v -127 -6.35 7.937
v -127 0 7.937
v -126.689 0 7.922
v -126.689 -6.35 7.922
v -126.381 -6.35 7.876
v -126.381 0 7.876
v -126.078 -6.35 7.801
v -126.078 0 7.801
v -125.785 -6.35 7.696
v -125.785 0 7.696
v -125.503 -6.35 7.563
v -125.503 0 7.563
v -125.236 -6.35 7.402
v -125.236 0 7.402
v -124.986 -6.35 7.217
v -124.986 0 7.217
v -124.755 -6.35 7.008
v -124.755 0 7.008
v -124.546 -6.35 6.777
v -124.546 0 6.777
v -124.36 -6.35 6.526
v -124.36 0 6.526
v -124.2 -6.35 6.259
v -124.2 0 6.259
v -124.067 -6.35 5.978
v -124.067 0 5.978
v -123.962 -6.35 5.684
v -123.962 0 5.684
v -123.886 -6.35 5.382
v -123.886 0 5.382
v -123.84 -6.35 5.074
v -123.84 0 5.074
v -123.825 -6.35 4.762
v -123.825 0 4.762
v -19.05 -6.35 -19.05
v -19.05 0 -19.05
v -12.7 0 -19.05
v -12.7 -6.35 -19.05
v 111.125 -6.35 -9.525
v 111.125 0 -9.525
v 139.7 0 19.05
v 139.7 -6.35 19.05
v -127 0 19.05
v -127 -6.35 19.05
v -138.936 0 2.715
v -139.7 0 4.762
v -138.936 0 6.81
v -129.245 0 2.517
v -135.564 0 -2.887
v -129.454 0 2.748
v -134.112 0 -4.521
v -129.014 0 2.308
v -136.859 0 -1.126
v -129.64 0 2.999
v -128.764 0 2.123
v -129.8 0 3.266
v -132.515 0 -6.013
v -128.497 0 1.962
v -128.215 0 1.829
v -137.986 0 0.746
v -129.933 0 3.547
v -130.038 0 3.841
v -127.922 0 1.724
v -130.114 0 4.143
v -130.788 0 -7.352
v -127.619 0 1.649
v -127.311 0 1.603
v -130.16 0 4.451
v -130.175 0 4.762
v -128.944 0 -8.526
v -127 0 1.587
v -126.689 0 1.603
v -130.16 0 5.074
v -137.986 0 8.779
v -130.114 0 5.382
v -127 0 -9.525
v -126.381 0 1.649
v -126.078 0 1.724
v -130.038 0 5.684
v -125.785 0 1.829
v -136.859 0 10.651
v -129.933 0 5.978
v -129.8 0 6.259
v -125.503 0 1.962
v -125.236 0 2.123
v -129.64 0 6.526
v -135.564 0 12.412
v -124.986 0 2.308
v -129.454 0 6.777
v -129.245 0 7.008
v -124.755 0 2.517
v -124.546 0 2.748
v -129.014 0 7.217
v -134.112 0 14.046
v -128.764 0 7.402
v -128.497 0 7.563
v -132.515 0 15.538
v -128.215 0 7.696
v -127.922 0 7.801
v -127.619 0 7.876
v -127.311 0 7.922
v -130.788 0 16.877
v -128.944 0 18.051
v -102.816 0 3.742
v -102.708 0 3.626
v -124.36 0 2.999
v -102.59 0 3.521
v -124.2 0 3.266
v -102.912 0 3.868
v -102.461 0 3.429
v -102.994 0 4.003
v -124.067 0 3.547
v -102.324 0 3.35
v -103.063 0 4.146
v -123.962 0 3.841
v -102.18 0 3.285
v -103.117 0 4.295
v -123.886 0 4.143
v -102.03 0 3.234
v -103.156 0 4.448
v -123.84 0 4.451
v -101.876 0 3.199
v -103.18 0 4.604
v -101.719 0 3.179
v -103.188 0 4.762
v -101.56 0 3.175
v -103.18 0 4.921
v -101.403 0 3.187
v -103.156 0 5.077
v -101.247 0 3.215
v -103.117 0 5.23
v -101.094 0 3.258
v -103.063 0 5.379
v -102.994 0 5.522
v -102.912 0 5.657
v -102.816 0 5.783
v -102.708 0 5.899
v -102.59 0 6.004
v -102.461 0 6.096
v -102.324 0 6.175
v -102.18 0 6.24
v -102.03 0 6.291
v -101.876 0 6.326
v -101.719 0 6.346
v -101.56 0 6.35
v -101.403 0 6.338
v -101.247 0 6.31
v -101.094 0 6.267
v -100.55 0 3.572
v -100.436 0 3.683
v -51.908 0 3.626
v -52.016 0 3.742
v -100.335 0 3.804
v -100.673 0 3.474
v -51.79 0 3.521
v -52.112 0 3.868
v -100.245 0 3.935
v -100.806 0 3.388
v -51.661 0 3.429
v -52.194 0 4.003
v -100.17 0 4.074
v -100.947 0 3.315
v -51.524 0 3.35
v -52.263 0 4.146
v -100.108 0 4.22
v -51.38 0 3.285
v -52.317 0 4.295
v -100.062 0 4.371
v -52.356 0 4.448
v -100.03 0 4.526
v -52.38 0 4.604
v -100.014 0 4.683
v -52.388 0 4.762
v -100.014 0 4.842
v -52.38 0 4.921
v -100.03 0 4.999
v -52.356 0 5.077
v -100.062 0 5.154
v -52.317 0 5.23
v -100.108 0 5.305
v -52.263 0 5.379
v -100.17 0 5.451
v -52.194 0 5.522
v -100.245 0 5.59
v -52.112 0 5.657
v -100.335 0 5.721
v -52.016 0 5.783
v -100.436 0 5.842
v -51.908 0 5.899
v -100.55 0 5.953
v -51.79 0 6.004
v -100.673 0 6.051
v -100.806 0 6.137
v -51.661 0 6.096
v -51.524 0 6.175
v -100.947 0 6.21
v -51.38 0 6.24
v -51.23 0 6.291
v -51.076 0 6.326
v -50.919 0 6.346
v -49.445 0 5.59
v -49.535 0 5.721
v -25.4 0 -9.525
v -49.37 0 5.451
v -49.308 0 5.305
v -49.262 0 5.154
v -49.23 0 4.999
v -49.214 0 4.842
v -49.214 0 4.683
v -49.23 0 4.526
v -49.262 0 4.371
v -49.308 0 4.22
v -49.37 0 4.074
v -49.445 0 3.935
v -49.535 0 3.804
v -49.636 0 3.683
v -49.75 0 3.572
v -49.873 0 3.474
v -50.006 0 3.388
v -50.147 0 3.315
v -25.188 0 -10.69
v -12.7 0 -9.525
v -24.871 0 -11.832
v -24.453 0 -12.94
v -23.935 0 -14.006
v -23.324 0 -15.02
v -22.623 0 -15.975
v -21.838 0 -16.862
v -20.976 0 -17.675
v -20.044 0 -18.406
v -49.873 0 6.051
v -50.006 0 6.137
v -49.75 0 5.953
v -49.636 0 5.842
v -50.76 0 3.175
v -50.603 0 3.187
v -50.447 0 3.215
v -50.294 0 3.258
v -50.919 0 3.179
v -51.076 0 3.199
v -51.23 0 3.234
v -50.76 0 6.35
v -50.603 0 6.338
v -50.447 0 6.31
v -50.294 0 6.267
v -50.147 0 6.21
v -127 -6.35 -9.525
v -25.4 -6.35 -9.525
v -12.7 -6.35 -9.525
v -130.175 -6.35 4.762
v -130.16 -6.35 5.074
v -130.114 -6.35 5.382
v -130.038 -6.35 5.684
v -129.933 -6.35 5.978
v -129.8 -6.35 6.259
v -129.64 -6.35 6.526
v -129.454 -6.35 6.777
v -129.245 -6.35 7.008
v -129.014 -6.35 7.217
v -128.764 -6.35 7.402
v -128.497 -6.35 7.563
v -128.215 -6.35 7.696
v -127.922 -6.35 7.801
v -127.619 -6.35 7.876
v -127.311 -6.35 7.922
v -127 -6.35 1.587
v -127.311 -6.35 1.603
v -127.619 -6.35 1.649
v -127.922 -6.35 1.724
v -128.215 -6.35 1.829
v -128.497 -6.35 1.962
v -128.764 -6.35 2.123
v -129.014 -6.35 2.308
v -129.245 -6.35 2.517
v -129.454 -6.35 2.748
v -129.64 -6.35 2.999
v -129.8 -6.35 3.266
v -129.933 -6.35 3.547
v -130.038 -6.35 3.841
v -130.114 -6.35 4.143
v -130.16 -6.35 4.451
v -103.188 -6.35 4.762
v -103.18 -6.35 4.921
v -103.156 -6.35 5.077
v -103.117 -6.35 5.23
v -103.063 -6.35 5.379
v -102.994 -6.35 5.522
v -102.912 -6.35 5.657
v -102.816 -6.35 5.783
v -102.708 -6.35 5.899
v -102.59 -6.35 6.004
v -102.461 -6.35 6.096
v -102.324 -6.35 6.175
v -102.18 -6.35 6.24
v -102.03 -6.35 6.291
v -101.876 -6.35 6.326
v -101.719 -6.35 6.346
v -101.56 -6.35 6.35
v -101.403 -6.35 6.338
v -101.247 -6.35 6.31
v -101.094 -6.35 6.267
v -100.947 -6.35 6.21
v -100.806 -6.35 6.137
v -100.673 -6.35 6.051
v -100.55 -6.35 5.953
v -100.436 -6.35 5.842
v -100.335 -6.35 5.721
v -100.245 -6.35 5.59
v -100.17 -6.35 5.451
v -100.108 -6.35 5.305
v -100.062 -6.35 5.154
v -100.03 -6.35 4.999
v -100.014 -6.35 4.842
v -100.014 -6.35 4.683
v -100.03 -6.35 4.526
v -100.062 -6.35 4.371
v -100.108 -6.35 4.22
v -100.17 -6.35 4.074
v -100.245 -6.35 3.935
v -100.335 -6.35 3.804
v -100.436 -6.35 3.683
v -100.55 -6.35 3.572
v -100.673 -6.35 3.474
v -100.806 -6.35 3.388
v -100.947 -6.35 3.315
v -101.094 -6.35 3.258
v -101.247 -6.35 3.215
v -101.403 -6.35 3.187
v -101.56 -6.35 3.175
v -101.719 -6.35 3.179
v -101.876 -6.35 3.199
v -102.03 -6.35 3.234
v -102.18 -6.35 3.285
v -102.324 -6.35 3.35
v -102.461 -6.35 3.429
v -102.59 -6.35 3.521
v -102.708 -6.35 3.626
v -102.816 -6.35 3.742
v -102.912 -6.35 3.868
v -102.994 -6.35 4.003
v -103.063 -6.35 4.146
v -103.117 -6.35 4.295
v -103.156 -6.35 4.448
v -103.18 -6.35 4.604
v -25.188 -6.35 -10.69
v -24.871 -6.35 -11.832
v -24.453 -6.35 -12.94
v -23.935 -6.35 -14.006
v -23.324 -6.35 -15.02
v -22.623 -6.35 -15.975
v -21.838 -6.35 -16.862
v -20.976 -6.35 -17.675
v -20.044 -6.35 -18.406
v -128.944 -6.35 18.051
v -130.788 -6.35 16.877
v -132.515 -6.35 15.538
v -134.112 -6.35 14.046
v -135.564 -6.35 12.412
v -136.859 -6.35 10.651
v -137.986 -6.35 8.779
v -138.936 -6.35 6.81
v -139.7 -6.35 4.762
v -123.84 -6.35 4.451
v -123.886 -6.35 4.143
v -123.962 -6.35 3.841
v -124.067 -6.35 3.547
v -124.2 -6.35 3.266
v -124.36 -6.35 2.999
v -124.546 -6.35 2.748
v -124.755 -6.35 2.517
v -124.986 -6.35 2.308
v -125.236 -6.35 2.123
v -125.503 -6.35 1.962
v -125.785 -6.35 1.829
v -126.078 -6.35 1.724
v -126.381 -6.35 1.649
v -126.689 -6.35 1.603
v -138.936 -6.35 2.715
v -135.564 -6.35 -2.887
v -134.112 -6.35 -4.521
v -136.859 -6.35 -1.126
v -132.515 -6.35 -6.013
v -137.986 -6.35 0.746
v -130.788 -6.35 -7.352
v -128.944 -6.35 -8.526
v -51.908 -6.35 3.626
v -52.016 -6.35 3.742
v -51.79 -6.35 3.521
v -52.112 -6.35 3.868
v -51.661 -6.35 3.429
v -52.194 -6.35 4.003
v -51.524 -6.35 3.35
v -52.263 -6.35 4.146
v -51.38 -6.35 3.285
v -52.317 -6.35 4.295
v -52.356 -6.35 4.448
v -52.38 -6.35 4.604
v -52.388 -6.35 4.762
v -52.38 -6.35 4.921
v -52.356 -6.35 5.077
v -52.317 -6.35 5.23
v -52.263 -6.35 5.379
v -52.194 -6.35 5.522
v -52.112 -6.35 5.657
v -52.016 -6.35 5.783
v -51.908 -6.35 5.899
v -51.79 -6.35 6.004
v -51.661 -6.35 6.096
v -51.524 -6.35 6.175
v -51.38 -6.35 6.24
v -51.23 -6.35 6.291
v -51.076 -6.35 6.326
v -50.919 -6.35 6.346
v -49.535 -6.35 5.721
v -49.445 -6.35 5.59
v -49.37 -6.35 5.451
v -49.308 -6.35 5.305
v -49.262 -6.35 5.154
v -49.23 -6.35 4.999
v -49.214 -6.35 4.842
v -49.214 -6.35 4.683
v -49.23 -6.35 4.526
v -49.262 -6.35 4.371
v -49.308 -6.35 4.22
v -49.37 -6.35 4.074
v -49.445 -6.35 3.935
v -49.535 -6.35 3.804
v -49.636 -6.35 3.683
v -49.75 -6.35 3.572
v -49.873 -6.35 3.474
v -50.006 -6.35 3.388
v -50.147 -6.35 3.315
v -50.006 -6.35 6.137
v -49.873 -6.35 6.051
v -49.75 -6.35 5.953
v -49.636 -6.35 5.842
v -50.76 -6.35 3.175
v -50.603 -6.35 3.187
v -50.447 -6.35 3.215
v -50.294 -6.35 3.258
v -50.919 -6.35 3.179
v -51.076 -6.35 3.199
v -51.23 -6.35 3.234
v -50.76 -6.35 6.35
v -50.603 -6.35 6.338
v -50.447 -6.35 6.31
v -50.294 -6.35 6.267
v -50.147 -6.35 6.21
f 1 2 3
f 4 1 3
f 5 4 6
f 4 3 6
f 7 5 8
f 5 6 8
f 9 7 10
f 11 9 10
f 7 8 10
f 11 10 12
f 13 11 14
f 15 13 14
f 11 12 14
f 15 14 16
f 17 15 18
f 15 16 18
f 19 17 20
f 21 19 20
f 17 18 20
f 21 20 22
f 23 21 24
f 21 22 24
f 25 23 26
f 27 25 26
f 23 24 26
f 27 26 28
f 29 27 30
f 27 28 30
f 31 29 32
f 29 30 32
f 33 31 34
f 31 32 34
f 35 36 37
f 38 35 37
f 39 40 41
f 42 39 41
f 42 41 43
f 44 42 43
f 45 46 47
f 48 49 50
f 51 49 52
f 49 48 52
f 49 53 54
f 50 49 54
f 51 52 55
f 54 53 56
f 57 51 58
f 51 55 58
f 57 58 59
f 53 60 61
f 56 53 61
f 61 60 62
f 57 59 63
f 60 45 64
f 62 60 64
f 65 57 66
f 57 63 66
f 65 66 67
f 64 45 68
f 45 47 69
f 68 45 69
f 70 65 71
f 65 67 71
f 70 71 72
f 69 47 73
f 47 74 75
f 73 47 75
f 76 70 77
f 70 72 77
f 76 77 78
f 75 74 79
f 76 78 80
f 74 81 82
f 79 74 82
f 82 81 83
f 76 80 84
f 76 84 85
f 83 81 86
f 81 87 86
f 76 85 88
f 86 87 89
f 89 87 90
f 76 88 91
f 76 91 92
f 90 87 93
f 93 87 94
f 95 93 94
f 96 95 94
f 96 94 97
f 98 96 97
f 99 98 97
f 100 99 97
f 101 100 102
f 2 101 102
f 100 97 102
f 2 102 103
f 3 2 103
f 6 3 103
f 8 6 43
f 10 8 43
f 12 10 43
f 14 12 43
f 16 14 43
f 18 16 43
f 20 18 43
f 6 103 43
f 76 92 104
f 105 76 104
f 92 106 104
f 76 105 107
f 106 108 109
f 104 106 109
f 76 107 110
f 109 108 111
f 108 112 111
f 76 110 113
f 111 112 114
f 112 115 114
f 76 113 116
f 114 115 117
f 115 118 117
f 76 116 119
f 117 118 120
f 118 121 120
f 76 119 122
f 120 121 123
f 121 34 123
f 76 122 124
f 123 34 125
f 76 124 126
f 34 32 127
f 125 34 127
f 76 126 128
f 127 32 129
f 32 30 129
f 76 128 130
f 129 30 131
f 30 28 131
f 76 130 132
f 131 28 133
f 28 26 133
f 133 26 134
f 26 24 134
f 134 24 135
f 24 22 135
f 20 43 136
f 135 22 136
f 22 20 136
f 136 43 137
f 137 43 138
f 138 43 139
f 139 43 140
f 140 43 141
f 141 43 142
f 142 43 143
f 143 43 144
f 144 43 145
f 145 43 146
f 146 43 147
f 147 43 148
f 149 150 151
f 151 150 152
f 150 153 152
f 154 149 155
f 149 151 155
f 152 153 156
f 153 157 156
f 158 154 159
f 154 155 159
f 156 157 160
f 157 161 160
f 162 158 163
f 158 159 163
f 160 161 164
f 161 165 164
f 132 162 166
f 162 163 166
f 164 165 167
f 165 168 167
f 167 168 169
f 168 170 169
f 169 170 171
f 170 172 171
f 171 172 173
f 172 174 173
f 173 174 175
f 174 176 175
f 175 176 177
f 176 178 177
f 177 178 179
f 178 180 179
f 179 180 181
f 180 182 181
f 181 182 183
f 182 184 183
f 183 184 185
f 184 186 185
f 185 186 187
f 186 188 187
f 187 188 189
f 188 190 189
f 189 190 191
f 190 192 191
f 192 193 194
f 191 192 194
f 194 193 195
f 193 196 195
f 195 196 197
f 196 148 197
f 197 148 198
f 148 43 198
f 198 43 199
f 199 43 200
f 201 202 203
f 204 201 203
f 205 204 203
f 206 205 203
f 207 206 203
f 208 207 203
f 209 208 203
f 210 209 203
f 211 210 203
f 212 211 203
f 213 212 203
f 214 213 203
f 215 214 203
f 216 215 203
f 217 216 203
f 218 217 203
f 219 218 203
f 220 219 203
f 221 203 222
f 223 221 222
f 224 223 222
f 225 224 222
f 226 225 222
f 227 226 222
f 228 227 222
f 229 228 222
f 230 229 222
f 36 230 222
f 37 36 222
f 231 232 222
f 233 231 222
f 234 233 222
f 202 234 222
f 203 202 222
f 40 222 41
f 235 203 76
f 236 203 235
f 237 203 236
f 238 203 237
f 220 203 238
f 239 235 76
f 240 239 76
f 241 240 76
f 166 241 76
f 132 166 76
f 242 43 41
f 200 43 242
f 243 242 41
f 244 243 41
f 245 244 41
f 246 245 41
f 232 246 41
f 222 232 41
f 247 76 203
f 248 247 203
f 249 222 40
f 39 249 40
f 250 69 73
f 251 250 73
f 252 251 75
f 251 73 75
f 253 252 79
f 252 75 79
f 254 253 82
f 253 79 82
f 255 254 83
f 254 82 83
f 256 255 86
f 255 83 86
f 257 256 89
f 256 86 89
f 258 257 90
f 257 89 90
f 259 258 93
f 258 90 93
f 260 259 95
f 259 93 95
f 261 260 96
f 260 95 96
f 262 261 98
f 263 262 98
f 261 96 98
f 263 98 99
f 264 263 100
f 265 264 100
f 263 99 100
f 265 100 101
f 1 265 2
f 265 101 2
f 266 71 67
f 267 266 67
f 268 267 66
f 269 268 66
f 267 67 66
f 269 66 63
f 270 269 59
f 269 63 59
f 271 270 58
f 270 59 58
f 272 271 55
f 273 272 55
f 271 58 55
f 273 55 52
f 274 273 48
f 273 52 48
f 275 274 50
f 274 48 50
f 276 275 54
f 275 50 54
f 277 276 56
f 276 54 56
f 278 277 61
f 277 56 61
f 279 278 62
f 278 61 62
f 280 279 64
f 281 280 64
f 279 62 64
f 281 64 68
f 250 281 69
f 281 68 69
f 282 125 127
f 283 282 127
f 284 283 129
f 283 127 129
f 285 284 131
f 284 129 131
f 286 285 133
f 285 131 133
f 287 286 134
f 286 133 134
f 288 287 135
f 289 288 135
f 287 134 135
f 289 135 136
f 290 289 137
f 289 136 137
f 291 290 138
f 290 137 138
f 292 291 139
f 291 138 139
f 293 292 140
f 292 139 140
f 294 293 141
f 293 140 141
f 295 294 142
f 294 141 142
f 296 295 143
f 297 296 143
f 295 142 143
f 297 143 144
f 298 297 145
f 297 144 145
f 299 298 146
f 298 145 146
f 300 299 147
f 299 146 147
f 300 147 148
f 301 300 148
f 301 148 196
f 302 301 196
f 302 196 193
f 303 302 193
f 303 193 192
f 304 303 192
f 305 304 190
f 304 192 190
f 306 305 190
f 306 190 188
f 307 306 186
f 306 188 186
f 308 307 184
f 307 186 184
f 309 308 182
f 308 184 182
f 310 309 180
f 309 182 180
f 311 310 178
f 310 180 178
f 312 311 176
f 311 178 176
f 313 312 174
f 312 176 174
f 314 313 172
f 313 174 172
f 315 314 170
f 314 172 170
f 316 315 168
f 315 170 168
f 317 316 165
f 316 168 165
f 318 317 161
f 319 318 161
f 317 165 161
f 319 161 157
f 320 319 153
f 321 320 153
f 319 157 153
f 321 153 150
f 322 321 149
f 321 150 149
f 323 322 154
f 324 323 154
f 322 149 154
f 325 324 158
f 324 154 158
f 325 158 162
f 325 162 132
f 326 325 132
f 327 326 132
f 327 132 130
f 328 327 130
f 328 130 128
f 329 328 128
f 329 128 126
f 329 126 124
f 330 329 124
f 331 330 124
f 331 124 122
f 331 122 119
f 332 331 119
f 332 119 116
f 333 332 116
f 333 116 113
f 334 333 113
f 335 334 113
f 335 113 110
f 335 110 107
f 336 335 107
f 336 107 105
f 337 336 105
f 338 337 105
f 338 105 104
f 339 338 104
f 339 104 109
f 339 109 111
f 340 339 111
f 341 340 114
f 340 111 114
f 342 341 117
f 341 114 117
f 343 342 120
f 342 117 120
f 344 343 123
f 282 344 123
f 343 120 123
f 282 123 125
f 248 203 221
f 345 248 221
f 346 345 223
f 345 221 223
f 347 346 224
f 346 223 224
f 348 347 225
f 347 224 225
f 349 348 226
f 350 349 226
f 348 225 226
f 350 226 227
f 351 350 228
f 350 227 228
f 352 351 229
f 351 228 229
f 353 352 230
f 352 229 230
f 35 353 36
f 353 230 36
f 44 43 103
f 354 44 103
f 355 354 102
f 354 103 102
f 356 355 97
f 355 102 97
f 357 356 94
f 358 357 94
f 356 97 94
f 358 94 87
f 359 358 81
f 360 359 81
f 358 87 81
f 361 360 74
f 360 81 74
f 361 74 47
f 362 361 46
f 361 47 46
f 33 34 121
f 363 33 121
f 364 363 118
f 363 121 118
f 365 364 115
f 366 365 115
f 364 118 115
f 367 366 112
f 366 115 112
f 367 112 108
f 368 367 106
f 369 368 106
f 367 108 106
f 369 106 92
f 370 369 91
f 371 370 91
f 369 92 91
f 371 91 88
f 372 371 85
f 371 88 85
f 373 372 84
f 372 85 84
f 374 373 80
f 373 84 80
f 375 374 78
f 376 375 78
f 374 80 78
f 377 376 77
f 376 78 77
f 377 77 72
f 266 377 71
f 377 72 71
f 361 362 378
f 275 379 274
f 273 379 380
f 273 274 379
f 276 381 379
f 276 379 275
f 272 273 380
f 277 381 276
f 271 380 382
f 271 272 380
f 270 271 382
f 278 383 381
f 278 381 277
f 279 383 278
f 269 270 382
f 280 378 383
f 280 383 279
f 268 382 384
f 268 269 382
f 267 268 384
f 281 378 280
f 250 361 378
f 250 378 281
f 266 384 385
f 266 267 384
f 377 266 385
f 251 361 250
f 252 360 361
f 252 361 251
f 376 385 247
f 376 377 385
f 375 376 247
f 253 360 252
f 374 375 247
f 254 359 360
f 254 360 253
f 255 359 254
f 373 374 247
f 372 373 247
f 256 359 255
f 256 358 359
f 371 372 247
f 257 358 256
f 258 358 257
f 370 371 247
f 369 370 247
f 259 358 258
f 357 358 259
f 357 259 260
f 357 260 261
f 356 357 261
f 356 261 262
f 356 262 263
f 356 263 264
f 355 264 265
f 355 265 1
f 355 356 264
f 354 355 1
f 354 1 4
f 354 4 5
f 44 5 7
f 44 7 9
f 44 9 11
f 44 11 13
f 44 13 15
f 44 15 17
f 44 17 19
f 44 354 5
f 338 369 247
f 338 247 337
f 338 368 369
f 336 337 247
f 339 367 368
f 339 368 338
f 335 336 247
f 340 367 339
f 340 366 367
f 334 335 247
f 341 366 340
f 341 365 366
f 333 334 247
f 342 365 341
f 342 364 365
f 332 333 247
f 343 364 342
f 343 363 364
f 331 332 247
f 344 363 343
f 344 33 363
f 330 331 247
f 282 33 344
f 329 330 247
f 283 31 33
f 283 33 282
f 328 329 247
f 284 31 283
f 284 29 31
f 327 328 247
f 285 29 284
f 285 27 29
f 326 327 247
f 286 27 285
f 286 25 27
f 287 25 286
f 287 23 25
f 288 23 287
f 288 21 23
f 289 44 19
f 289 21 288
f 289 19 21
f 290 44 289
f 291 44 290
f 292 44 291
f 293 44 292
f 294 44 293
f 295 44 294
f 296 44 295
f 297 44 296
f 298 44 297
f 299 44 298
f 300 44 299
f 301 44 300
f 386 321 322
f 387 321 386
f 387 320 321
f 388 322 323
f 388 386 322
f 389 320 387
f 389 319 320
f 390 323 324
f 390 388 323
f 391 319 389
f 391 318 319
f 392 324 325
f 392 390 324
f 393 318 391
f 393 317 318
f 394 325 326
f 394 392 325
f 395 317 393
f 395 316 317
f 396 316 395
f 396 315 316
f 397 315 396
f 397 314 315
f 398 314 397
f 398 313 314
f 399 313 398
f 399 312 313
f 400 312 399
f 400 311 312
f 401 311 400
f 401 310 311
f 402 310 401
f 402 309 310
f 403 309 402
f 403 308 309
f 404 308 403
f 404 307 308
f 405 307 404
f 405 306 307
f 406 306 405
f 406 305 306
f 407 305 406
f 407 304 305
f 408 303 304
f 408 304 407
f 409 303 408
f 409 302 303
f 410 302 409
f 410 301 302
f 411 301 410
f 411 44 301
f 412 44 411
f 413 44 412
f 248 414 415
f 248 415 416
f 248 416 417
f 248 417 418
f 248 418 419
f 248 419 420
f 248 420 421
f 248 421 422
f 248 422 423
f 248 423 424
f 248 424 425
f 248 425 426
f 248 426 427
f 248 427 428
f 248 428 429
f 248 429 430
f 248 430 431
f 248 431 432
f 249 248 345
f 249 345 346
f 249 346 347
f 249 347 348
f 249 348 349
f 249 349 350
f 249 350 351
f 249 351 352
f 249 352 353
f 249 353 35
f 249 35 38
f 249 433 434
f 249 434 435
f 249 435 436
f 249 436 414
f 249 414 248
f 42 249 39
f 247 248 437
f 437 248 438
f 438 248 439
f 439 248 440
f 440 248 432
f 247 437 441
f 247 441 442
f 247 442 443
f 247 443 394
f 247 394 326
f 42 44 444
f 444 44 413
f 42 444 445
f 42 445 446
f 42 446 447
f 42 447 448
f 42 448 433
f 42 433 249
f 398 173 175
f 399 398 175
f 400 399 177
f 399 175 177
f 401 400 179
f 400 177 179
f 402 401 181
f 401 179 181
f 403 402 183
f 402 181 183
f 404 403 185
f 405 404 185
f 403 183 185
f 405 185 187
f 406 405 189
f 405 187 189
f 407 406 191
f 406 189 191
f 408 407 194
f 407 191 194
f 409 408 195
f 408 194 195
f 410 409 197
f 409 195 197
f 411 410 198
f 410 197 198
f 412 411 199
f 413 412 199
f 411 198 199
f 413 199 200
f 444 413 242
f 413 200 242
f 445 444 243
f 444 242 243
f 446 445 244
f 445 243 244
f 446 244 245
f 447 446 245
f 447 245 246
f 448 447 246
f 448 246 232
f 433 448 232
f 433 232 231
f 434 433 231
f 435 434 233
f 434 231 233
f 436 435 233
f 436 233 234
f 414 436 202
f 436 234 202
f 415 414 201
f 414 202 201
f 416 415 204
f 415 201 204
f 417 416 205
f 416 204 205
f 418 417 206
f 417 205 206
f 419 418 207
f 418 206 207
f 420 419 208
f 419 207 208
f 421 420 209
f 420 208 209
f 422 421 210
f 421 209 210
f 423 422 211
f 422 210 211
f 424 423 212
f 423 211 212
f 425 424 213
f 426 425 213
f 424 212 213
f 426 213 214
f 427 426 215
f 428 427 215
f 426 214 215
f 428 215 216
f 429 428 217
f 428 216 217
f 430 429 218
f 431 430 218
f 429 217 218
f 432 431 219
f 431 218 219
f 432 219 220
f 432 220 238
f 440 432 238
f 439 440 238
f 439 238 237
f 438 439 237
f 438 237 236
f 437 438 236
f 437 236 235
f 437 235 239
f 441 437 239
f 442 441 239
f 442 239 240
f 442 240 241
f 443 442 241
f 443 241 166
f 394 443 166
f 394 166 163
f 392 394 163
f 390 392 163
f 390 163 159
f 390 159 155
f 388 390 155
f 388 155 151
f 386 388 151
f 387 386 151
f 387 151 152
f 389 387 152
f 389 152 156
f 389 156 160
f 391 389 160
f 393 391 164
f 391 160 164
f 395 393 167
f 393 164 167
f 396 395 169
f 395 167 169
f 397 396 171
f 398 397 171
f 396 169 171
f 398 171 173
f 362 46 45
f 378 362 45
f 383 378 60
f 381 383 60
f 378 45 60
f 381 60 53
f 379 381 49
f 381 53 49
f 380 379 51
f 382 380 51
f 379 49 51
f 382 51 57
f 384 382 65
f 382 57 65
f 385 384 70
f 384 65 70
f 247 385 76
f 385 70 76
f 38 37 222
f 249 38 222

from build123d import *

# Parameters (mm, degrees)
F1_DEPTH = 6.35


with BuildPart() as f1:
    # F0 (on Front) → F1 (new body)
    with BuildSketch(Plane.XZ):
        with BuildLine():
            Line((-127, 1.5875), (-127, -9.525))
            Line((-127, -9.525), (-25.4, -9.525))
            Line((-25.4, -9.525), (-25.4, 4.7625))
            Line((-25.4, 4.7625), (-49.2125, 4.7625))
            ThreePointArc((-49.2125, 4.7625), (-50.8, 3.175), (-52.3875, 4.7625))
            Line((-52.3875, 4.7625), (-100.0125, 4.7625))
            ThreePointArc((-100.0125, 4.7625), (-101.6, 3.175), (-103.1875, 4.7625))
            Line((-103.1875, 4.7625), (-123.825, 4.7625))
            ThreePointArc((-123.825, 4.7625), (-124.7549359697, 2.5174359697), (-127, 1.5875))
        make_face()
        with BuildLine():
            Line((-25.4, 19.05), (-127, 19.05))
            Line((-127, 19.05), (-127, 7.9375))
            ThreePointArc((-127, 7.9375), (-124.7549359697, 7.0075640303), (-123.825, 4.7625))
            Line((-123.825, 4.7625), (-103.1875, 4.7625))
            ThreePointArc((-103.1875, 4.7625), (-101.6, 6.35), (-100.0125, 4.7625))
            Line((-100.0125, 4.7625), (-52.3875, 4.7625))
            ThreePointArc((-52.3875, 4.7625), (-50.8, 6.35), (-49.2125, 4.7625))
            Line((-49.2125, 4.7625), (-25.4, 4.7625))
            Line((-25.4, 4.7625), (-25.4, 19.05))
        make_face()
        with BuildLine():
            Line((-127, 7.9375), (-127, 19.05))
            ThreePointArc((-127, 19.05), (-134.856835688, 13.2456595004), (-139.7, 4.7625))
            Line((-139.7, 4.7625), (-130.175, 4.7625))
            ThreePointArc((-130.175, 4.7625), (-129.2450640303, 7.0075640303), (-127, 7.9375))
        make_face()
        with BuildLine():
            Line((-130.175, 4.7625), (-139.7, 4.7625))
            ThreePointArc((-139.7, 4.7625), (-134.856835688, -3.7206595004), (-127, -9.525))
            Line((-127, -9.525), (-127, 1.5875))
            ThreePointArc((-127, 1.5875), (-129.2450640303, 2.5174359697), (-130.175, 4.7625))
        make_face()
        Polygon((-12.7, 19.05), (-19.05, 19.05), (-19.05, -19.05), (-12.7, -19.05), (-12.7, -9.525), (-12.7, 4.7625), align=None)
        with BuildLine():
            Line((-19.05, 19.05), (-25.4, 19.05))
            Line((-25.4, 19.05), (-25.4, 4.7625))
            Line((-25.4, 4.7625), (-25.4, -9.525))
            ThreePointArc((-25.4, -9.525), (-23.3236183324, -15.0199122216), (-19.05, -19.05))
            Line((-19.05, -19.05), (-19.05, 19.05))
        make_face()
        Polygon((139.7, 19.05), (119.4944237276, 19.05), (105.2069237276, 4.7625), (-12.7, 4.7625), (-12.7, -9.525), (111.125, -9.525), align=None)
        Polygon((119.4944237276, 19.05), (-12.7, 19.05), (-12.7, 4.7625), (105.2069237276, 4.7625), align=None)
    extrude(amount=F1_DEPTH)


solid = f1.part
